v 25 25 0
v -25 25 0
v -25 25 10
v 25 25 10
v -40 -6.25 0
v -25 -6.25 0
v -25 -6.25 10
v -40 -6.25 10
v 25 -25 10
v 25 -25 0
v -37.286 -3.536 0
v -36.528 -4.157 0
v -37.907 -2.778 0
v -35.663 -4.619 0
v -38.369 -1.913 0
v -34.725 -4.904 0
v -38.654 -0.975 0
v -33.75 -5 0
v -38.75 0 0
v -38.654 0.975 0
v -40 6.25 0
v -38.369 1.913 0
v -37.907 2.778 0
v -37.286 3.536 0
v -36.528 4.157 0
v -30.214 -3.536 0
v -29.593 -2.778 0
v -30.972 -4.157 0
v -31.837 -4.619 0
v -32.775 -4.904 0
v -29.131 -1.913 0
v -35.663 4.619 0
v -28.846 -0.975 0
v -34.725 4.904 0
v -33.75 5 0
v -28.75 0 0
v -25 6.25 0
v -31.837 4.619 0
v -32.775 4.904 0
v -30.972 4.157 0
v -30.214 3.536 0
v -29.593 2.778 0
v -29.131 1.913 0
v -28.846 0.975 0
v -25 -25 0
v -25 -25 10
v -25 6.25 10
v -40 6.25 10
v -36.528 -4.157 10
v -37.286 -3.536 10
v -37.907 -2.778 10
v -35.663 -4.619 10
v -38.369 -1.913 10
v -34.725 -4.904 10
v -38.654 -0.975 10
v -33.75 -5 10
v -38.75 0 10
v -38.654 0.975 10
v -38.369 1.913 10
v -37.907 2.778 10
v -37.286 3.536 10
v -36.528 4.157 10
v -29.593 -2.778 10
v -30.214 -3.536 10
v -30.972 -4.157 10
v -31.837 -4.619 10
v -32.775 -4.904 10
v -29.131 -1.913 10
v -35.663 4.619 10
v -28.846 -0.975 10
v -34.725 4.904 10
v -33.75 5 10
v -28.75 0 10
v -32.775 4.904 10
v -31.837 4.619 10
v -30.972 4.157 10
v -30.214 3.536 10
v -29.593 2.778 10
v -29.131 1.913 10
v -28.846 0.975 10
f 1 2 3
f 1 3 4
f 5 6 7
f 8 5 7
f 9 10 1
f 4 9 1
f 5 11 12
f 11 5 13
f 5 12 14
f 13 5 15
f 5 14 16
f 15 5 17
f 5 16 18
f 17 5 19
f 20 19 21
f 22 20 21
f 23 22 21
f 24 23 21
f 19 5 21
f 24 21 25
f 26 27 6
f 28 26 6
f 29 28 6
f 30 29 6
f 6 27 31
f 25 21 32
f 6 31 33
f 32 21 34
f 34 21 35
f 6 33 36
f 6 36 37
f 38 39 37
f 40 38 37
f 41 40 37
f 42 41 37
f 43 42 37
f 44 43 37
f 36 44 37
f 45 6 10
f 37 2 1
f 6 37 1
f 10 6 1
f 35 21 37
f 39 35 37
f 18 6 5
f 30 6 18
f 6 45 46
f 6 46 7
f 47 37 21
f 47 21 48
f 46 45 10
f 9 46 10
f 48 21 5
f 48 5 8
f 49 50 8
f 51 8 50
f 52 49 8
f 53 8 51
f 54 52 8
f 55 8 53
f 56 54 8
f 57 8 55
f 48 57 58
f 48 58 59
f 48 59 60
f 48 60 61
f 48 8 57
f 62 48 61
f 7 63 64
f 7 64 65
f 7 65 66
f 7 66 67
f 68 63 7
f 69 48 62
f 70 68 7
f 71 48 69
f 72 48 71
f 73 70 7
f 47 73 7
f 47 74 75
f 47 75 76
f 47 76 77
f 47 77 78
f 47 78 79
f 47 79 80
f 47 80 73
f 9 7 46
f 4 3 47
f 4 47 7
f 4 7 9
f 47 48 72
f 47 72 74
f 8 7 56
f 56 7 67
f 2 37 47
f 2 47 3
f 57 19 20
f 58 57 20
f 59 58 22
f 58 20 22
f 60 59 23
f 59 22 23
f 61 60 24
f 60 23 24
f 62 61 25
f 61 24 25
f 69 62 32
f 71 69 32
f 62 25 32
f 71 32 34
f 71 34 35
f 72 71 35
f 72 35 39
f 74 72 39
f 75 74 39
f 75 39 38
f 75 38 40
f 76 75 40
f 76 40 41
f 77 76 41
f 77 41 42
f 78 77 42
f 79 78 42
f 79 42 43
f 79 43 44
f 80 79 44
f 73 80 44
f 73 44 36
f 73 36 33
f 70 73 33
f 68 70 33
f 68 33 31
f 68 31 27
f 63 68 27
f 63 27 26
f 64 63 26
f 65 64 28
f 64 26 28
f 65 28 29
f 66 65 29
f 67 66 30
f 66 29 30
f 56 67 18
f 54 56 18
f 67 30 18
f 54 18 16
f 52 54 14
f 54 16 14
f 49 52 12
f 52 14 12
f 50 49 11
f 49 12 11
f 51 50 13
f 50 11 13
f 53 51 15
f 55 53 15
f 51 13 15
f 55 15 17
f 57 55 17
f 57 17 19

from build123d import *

# Parameters (mm, degrees)
SKETCH1_W           = 50
SKETCH1_H           = 50
BOSS_EXTRUDE1_DEPTH = 10
SKETCH6_W           = 10
SKETCH6_H           = 12.5
BOSS_EXTRUDE5_DEPTH = 15
SKETCH7_R           = 5
CUT_EXTRUDE2_DEPTH  = 49.218253805


with BuildPart() as part:
    # Sketch1 → Boss-Extrude1 (new body)
    with BuildSketch(Plane.XY):
        Rectangle(SKETCH1_W, SKETCH1_H)
    extrude(amount=BOSS_EXTRUDE1_DEPTH)

    # Sketch6 → Boss-Extrude5 (add)
    with BuildSketch(Plane.ZY.offset(25)):
        with Locations((5, 0)):
            Rectangle(SKETCH6_W, SKETCH6_H)
    extrude(amount=BOSS_EXTRUDE5_DEPTH)

    # Sketch7 → Cut-Extrude2 (cut, through all)
    with BuildSketch(Plane(origin=(0, 0, 0), x_dir=(-1, 0, 0), z_dir=(0, 0, -1))):
        with Locations((33.75, 0)):
            Circle(SKETCH7_R)
    extrude(amount=-CUT_EXTRUDE2_DEPTH, mode=Mode.SUBTRACT)


solid = part.part
